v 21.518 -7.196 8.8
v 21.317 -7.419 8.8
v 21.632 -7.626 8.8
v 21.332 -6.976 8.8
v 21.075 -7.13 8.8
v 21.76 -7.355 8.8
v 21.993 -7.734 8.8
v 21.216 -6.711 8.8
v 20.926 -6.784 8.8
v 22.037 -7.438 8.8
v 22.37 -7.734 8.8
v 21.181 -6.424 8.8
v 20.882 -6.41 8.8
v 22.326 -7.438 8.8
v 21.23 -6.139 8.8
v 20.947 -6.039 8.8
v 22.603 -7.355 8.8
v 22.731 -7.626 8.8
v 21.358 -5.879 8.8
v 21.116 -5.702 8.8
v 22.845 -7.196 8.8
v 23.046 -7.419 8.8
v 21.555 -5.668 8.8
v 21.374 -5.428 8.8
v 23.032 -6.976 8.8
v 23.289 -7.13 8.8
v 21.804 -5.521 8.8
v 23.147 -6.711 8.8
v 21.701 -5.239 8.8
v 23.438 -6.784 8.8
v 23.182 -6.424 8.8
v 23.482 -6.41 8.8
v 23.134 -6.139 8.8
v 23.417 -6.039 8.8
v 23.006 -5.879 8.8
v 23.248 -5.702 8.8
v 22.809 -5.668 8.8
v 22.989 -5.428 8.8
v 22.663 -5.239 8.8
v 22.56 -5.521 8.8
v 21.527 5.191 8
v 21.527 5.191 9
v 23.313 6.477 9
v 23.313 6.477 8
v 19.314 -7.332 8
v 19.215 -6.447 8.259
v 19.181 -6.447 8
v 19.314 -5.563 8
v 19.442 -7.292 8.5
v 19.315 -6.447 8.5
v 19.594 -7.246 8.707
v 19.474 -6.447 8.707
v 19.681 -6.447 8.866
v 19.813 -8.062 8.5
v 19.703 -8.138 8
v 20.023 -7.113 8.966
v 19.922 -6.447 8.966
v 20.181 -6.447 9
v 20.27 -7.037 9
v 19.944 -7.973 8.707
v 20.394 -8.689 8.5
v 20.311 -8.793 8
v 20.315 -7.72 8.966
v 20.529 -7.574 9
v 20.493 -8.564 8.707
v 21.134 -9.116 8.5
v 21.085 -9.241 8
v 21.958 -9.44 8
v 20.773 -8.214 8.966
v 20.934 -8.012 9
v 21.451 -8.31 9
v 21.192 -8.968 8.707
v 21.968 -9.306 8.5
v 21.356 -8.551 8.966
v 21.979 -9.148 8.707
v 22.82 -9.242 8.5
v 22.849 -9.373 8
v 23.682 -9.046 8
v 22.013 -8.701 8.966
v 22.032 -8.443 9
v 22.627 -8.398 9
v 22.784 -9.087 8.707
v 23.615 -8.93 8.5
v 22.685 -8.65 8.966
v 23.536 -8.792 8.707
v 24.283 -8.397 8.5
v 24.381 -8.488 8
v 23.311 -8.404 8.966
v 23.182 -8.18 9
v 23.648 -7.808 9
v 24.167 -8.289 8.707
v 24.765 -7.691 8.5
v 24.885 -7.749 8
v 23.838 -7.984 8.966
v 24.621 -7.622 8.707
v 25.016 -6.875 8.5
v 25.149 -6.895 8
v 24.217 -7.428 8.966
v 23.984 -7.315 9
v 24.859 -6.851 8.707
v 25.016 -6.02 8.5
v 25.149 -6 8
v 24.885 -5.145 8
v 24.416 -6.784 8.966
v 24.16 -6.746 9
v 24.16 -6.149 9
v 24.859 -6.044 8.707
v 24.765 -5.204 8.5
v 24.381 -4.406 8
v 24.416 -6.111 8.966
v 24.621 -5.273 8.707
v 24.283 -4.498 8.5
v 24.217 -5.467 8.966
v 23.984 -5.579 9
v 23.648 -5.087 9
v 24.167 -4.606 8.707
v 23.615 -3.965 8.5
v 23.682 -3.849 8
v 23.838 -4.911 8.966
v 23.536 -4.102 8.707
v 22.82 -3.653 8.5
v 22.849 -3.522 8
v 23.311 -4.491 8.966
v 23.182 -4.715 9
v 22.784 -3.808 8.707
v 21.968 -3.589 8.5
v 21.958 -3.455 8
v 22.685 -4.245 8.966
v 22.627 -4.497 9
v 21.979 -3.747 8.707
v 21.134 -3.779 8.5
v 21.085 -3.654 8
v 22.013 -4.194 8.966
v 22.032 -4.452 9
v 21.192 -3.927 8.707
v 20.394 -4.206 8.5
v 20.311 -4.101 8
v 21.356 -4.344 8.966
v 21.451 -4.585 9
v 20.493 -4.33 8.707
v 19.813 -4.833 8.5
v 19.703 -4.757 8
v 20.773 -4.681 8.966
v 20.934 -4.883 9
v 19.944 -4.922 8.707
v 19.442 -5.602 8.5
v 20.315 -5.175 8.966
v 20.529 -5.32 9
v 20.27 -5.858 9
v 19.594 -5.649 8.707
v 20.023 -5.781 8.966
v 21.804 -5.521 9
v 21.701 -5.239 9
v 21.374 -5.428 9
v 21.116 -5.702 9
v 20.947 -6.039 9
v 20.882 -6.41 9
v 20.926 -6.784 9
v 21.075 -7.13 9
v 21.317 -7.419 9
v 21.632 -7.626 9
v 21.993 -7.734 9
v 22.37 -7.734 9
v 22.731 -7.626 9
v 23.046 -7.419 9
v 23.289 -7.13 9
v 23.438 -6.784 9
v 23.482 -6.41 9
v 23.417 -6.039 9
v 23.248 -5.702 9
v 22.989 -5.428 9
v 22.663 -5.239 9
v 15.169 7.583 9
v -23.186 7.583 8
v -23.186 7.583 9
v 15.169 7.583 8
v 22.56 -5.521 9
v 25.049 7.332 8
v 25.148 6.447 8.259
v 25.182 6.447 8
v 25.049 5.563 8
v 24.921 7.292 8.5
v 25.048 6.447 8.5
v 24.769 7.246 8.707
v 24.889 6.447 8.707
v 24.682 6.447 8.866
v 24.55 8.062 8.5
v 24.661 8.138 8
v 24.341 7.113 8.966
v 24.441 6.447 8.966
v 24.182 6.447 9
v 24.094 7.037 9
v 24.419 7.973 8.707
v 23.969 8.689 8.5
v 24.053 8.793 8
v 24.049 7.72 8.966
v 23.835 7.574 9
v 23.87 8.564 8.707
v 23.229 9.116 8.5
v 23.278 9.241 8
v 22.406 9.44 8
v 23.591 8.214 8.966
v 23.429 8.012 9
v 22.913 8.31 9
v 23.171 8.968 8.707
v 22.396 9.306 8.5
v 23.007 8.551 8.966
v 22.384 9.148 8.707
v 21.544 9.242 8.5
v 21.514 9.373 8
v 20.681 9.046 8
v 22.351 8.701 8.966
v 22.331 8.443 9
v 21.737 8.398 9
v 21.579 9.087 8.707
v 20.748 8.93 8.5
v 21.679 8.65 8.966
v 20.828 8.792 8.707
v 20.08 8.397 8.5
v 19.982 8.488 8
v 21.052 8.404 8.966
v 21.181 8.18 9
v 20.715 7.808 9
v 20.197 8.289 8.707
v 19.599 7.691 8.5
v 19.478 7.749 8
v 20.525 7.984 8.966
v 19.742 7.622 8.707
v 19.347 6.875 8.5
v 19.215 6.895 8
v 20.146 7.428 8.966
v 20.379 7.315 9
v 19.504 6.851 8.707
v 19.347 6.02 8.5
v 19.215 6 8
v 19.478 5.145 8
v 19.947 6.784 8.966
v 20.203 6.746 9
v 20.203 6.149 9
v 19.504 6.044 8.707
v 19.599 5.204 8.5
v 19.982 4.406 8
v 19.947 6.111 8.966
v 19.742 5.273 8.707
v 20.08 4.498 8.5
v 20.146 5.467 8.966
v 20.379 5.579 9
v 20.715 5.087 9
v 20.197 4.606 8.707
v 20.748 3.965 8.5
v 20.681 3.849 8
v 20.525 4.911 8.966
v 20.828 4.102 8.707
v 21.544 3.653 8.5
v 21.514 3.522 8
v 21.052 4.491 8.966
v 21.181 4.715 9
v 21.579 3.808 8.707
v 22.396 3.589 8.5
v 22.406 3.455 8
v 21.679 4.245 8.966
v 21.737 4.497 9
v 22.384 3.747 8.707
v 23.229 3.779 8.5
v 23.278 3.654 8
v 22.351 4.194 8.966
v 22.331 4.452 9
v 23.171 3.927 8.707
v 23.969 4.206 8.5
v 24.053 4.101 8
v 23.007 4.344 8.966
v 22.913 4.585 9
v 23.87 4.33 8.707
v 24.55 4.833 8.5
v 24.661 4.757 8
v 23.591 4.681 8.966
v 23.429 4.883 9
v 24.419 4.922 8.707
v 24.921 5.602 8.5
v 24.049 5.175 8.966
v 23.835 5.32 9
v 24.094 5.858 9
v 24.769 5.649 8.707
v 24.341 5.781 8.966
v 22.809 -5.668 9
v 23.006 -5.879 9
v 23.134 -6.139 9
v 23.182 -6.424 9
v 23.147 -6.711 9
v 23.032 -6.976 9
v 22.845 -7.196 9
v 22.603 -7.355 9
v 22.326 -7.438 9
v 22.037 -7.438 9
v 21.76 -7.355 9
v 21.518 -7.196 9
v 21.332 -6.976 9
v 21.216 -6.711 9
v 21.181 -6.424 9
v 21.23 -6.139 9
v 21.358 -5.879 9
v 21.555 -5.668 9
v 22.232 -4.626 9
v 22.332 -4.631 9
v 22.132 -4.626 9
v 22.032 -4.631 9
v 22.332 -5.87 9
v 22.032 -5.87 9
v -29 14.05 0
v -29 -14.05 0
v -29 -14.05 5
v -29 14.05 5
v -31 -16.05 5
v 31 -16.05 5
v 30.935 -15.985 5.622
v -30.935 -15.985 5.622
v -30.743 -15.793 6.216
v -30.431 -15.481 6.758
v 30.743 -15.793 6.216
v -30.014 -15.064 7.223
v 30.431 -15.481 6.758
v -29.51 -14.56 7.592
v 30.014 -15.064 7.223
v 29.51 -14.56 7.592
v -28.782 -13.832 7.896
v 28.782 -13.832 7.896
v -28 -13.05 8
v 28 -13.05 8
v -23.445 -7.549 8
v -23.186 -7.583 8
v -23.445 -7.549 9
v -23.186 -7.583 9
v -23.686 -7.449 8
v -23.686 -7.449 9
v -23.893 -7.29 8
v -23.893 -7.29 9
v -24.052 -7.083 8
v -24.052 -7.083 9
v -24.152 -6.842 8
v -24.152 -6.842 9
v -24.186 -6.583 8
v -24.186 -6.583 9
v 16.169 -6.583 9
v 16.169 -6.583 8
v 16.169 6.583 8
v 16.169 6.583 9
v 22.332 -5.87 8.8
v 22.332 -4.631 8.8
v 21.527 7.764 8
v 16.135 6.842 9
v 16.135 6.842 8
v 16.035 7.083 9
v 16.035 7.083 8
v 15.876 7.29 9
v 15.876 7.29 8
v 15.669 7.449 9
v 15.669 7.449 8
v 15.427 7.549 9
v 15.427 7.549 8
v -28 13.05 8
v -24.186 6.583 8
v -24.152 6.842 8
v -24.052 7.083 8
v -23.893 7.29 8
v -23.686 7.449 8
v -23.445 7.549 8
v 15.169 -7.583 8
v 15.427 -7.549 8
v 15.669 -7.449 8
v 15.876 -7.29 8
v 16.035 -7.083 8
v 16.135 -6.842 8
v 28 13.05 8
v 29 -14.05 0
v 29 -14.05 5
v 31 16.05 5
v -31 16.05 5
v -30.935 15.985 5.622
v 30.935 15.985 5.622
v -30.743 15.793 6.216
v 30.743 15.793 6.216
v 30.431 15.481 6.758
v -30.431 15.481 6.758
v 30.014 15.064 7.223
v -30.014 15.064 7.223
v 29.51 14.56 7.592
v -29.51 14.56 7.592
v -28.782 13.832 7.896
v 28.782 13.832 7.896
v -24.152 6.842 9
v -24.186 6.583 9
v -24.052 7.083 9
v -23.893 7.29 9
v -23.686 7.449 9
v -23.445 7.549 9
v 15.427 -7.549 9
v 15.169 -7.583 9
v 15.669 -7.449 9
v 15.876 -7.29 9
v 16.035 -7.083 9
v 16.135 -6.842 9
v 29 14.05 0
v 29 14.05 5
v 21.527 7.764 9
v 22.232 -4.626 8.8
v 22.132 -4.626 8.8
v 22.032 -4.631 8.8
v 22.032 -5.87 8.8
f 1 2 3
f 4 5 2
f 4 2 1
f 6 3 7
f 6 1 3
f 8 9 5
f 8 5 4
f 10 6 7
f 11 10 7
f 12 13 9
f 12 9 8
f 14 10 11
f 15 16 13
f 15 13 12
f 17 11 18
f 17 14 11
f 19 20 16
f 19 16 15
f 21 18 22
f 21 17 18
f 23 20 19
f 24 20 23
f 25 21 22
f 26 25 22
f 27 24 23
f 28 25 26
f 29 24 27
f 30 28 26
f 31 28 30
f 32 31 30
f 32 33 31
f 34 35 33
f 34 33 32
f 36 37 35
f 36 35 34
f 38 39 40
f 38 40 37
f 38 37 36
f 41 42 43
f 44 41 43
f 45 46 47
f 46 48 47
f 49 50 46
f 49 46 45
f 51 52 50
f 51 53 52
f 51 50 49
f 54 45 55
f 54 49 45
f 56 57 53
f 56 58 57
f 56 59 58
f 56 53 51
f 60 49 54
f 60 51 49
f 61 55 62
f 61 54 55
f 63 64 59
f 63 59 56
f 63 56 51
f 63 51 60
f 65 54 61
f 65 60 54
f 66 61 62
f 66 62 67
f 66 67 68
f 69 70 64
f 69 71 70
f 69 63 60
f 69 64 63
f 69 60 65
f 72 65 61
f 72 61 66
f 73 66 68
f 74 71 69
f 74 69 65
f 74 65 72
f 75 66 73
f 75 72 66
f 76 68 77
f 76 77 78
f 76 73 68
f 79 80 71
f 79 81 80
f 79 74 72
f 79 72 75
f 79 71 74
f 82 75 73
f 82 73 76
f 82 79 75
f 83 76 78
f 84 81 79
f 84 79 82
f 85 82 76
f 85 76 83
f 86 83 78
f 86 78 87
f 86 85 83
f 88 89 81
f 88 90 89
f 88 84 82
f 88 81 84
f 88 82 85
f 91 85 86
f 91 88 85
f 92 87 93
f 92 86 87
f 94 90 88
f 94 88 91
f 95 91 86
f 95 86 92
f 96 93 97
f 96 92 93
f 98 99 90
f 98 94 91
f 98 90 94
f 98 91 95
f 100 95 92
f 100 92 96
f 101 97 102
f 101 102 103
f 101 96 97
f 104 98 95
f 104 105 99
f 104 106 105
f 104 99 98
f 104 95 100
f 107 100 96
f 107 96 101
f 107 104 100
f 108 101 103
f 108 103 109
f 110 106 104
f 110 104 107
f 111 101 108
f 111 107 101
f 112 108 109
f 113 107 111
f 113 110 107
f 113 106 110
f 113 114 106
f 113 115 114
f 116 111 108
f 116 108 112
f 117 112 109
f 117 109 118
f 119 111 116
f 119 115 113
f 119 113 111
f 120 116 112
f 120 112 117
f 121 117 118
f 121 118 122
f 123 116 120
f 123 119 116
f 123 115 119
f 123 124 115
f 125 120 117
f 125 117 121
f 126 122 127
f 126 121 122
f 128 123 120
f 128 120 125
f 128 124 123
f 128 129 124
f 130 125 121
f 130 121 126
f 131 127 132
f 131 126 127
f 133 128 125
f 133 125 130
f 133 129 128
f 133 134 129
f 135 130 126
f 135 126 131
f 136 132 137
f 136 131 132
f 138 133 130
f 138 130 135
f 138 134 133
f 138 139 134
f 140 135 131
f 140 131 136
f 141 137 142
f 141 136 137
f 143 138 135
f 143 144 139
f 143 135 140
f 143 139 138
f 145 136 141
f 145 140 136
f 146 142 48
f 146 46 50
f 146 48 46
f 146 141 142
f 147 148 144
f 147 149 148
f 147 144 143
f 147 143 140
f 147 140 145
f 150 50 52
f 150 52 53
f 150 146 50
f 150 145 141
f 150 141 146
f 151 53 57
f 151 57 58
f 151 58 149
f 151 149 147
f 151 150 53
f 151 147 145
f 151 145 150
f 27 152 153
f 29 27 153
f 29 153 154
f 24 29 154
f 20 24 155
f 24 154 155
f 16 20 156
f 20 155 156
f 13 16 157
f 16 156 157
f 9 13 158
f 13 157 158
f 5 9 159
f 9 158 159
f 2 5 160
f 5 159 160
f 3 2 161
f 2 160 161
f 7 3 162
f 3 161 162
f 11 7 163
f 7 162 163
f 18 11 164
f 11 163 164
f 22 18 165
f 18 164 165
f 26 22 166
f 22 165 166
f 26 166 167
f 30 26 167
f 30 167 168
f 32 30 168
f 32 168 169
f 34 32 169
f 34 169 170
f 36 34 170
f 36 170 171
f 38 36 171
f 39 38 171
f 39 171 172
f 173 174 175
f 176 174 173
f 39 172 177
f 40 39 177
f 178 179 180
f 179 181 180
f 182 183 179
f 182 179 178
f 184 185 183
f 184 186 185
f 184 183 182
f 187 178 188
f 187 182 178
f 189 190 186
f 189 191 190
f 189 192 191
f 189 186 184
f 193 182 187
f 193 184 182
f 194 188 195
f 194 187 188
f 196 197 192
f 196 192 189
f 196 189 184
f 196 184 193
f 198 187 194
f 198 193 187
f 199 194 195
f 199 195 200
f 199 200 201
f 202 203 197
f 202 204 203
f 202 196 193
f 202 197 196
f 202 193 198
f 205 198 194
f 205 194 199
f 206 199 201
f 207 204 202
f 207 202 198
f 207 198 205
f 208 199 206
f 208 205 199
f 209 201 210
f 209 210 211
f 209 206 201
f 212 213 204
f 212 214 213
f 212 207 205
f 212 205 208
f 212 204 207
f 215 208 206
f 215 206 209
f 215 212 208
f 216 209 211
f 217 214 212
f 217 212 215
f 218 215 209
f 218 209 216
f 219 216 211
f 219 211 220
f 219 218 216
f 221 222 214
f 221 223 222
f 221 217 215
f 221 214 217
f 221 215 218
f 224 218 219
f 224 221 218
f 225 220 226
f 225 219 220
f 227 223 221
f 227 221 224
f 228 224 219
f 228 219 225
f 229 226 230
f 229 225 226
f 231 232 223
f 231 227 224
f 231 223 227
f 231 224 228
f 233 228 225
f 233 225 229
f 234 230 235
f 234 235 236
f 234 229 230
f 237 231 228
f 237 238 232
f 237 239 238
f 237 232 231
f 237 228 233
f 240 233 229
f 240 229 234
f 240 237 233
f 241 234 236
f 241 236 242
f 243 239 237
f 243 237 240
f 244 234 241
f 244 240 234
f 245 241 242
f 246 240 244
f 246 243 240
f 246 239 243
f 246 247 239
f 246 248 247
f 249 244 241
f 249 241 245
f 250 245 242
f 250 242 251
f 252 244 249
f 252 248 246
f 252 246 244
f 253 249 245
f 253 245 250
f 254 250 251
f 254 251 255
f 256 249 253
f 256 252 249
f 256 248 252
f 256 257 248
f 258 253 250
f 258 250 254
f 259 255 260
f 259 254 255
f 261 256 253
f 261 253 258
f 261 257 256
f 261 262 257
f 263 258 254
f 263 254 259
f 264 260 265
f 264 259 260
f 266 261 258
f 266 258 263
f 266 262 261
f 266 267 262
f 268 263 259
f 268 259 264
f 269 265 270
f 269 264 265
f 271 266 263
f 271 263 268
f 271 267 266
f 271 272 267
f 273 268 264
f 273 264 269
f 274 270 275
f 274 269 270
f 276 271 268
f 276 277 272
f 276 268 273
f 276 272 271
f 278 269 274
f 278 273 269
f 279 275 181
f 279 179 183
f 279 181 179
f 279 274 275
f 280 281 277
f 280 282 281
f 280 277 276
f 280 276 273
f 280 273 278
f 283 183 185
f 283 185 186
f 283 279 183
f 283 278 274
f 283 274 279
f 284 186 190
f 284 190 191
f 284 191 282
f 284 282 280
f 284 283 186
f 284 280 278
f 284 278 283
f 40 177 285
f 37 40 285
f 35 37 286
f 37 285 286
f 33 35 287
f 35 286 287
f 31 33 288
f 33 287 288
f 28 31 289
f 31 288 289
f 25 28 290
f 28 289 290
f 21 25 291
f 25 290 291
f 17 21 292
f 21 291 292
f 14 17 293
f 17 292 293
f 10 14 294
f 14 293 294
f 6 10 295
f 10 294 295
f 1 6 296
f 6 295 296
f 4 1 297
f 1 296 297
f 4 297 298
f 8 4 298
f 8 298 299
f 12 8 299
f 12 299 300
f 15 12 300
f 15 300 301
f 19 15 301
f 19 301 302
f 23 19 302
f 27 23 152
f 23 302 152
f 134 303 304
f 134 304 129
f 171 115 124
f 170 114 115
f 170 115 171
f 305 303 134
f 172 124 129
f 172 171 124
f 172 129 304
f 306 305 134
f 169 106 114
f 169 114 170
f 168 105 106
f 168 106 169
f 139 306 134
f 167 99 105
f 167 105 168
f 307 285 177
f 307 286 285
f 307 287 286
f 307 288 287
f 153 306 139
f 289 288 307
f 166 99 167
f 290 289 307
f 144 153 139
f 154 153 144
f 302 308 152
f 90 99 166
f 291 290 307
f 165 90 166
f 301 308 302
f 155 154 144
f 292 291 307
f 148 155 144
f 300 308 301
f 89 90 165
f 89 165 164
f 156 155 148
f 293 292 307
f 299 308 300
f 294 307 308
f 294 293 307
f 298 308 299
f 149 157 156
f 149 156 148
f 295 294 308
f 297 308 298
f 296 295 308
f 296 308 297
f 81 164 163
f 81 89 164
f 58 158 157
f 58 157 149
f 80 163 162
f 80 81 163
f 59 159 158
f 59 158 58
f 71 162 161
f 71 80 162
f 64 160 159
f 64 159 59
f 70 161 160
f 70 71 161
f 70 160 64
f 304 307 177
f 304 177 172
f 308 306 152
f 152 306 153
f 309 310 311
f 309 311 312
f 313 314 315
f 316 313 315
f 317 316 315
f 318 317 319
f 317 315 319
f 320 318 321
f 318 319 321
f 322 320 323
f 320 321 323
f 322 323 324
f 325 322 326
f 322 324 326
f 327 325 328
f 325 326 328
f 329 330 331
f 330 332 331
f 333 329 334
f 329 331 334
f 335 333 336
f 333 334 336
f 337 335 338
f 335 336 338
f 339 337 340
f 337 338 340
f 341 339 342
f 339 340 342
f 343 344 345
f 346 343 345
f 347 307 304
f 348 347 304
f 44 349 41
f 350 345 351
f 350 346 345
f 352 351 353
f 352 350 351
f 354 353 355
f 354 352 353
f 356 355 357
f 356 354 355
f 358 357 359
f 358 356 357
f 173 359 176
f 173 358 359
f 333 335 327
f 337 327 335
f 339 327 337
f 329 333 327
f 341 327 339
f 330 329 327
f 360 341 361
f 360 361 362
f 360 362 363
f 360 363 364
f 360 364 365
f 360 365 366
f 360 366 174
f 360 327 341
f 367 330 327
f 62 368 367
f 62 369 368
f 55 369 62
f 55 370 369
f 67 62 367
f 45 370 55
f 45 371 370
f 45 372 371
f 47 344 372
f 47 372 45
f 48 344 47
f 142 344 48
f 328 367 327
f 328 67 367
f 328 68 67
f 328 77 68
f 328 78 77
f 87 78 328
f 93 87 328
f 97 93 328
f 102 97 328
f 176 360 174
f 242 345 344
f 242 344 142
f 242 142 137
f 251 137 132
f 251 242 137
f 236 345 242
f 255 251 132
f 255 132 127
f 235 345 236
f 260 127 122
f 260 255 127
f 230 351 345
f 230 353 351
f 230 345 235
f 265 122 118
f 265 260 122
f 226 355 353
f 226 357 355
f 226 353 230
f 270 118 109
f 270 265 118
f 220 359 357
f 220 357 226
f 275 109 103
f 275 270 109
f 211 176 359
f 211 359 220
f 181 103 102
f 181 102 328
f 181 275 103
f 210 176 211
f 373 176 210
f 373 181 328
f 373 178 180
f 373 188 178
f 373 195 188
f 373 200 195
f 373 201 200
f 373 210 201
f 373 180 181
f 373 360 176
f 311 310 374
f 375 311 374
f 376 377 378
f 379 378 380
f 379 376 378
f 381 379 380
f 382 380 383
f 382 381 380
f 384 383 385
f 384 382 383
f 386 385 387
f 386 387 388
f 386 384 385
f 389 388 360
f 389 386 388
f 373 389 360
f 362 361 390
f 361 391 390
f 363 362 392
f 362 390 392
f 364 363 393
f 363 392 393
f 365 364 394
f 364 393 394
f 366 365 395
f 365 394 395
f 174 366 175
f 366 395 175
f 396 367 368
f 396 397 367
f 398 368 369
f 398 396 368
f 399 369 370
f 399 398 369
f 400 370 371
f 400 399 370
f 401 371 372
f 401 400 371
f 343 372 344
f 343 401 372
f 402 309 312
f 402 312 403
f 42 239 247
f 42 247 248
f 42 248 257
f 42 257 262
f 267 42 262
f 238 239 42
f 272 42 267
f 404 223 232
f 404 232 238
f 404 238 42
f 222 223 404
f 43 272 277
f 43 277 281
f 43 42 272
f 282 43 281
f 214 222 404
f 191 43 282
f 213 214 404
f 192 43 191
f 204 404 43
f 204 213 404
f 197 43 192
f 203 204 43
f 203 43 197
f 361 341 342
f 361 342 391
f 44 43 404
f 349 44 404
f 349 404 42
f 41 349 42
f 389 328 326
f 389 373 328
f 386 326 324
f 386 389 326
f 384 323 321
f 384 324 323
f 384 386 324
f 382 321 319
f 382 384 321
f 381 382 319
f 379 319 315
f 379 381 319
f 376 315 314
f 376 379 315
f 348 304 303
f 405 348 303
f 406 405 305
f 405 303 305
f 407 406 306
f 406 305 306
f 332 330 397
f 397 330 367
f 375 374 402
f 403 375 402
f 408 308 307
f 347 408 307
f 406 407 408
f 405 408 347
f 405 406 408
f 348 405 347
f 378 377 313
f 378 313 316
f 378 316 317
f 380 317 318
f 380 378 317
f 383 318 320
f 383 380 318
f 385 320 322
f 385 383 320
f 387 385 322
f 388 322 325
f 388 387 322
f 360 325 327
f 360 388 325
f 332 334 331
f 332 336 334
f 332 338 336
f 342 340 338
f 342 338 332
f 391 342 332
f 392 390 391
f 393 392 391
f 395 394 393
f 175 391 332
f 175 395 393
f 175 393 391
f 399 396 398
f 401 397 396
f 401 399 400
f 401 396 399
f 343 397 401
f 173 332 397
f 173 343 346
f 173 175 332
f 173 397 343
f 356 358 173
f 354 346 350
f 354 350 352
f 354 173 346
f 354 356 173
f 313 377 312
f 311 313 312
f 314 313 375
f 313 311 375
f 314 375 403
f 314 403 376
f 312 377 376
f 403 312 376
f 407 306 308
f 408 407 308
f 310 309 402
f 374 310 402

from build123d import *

# Parameters (mm, degrees)
SKETCH1_W           = 58
SKETCH1_H           = 28.1
BOSS_EXTRUDE1_DEPTH = 5
SKETCH2_W           = 62
SKETCH2_H           = 32.1
BOSS_EXTRUDE2_DEPTH = 3
FILLET1_R           = 3
SKETCH3_W           = 40.354739258
SKETCH3_H           = 15.166433462
BOSS_EXTRUDE3_DEPTH = 1
SKETCH3_6_R         = 3.000616935
BOSS_EXTRUDE4_DEPTH = 1
FILLET2_R           = 1
CUT_EXTRUDE2_DEPTH  = 1
CUT_EXTRUDE3_DEPTH  = 0.2
FILLET3_R           = 1


with BuildPart() as part:
    # Sketch1 → Boss-Extrude1 (new body)
    with BuildSketch(Plane.XY):
        Rectangle(SKETCH1_W, SKETCH1_H)
    extrude(amount=BOSS_EXTRUDE1_DEPTH)

    # Sketch2 → Boss-Extrude2 (add)
    with BuildSketch(Plane.XY.offset(5)):
        Rectangle(SKETCH2_W, SKETCH2_H)
    extrude(amount=BOSS_EXTRUDE2_DEPTH)

    # Fillet1
    fillet1_edges = [part.edges().sort_by_distance(p)[0] for p in [
        (0, -16.05, 8),
        (-31, 0, 8),
        (0, 16.05, 8),
        (31, 0, 8),
    ]]
    fillet(fillet1_edges, radius=FILLET1_R - 0.0001)  # a hair under: the kernel refuses the full size

    # Sketch3 → Boss-Extrude3 (add)
    with BuildSketch(Plane.XY.offset(8)):
        with Locations((-4.008748933, 0)):
            Rectangle(SKETCH3_W, SKETCH3_H)
    extrude(amount=BOSS_EXTRUDE3_DEPTH)

    # Sketch3<6> → Boss-Extrude4 (add)
    with BuildSketch(Plane.XY.offset(8)):
        with Locations((22.181744095, 6.447404534)):
            Circle(SKETCH3_6_R)
        with Locations(Location((22.181744095, -6.447404534, 0), (0, 0, 180))):
            Circle(SKETCH3_6_R)
    extrude(amount=BOSS_EXTRUDE4_DEPTH)

    # Fillet2
    fillet2_edges = [part.edges().sort_by_distance(p)[0] for p in [
        (19.18112716, 6.447404534, 9),
        (25.182361031, -6.447404534, 9),
    ]]
    fillet(fillet2_edges, radius=FILLET2_R - 0.0001)  # a hair under: the kernel refuses the full size

    # Sketch4 → Cut-Extrude2 (cut)
    with BuildSketch(Plane.XY.offset(9)):
        Polygon((21.526754794, 7.76375697), (21.526754794, 5.190828819), (23.312816568, 6.477292894), align=None)
    extrude(amount=-CUT_EXTRUDE2_DEPTH, mode=Mode.SUBTRACT)

    # Sketch5 → Cut-Extrude3 (cut)
    with BuildSketch(Plane.XY.offset(9)):
        with BuildLine():
            Line((22.662681188, -5.238974178), (22.559669099, -5.520902001))
            ThreePointArc((22.559669099, -5.520902001), (22.181744095, -7.448021469), (21.803819092, -5.520902001))
            Line((21.803819092, -5.520902001), (21.700807003, -5.238974178))
            ThreePointArc((21.700807003, -5.238974178), (22.181744095, -7.748021469), (22.662681188, -5.238974178))
        make_face()
        with BuildLine():
            Line((22.331744095, -5.86984139), (22.331744095, -4.631238623))
            ThreePointArc((22.331744095, -4.631238623), (22.181744095, -4.625054783), (22.031744095, -4.631238623))
            Line((22.031744095, -4.631238623), (22.031744095, -5.86984139))
            Line((22.031744095, -5.86984139), (22.331744095, -5.86984139))
        make_face()
    extrude(amount=-CUT_EXTRUDE3_DEPTH, mode=Mode.SUBTRACT)

    # Fillet3
    fillet3_edges = [part.edges().sort_by_distance(p)[0] for p in [
        (-24.186118562, 7.583216731, 8.5),
        (-24.186118562, -7.583216731, 8.5),
        (16.168620696, -7.583216731, 8.5),
        (16.168620696, 7.583216731, 8.5),
    ]]
    fillet(fillet3_edges, radius=FILLET3_R)


solid = part.part
